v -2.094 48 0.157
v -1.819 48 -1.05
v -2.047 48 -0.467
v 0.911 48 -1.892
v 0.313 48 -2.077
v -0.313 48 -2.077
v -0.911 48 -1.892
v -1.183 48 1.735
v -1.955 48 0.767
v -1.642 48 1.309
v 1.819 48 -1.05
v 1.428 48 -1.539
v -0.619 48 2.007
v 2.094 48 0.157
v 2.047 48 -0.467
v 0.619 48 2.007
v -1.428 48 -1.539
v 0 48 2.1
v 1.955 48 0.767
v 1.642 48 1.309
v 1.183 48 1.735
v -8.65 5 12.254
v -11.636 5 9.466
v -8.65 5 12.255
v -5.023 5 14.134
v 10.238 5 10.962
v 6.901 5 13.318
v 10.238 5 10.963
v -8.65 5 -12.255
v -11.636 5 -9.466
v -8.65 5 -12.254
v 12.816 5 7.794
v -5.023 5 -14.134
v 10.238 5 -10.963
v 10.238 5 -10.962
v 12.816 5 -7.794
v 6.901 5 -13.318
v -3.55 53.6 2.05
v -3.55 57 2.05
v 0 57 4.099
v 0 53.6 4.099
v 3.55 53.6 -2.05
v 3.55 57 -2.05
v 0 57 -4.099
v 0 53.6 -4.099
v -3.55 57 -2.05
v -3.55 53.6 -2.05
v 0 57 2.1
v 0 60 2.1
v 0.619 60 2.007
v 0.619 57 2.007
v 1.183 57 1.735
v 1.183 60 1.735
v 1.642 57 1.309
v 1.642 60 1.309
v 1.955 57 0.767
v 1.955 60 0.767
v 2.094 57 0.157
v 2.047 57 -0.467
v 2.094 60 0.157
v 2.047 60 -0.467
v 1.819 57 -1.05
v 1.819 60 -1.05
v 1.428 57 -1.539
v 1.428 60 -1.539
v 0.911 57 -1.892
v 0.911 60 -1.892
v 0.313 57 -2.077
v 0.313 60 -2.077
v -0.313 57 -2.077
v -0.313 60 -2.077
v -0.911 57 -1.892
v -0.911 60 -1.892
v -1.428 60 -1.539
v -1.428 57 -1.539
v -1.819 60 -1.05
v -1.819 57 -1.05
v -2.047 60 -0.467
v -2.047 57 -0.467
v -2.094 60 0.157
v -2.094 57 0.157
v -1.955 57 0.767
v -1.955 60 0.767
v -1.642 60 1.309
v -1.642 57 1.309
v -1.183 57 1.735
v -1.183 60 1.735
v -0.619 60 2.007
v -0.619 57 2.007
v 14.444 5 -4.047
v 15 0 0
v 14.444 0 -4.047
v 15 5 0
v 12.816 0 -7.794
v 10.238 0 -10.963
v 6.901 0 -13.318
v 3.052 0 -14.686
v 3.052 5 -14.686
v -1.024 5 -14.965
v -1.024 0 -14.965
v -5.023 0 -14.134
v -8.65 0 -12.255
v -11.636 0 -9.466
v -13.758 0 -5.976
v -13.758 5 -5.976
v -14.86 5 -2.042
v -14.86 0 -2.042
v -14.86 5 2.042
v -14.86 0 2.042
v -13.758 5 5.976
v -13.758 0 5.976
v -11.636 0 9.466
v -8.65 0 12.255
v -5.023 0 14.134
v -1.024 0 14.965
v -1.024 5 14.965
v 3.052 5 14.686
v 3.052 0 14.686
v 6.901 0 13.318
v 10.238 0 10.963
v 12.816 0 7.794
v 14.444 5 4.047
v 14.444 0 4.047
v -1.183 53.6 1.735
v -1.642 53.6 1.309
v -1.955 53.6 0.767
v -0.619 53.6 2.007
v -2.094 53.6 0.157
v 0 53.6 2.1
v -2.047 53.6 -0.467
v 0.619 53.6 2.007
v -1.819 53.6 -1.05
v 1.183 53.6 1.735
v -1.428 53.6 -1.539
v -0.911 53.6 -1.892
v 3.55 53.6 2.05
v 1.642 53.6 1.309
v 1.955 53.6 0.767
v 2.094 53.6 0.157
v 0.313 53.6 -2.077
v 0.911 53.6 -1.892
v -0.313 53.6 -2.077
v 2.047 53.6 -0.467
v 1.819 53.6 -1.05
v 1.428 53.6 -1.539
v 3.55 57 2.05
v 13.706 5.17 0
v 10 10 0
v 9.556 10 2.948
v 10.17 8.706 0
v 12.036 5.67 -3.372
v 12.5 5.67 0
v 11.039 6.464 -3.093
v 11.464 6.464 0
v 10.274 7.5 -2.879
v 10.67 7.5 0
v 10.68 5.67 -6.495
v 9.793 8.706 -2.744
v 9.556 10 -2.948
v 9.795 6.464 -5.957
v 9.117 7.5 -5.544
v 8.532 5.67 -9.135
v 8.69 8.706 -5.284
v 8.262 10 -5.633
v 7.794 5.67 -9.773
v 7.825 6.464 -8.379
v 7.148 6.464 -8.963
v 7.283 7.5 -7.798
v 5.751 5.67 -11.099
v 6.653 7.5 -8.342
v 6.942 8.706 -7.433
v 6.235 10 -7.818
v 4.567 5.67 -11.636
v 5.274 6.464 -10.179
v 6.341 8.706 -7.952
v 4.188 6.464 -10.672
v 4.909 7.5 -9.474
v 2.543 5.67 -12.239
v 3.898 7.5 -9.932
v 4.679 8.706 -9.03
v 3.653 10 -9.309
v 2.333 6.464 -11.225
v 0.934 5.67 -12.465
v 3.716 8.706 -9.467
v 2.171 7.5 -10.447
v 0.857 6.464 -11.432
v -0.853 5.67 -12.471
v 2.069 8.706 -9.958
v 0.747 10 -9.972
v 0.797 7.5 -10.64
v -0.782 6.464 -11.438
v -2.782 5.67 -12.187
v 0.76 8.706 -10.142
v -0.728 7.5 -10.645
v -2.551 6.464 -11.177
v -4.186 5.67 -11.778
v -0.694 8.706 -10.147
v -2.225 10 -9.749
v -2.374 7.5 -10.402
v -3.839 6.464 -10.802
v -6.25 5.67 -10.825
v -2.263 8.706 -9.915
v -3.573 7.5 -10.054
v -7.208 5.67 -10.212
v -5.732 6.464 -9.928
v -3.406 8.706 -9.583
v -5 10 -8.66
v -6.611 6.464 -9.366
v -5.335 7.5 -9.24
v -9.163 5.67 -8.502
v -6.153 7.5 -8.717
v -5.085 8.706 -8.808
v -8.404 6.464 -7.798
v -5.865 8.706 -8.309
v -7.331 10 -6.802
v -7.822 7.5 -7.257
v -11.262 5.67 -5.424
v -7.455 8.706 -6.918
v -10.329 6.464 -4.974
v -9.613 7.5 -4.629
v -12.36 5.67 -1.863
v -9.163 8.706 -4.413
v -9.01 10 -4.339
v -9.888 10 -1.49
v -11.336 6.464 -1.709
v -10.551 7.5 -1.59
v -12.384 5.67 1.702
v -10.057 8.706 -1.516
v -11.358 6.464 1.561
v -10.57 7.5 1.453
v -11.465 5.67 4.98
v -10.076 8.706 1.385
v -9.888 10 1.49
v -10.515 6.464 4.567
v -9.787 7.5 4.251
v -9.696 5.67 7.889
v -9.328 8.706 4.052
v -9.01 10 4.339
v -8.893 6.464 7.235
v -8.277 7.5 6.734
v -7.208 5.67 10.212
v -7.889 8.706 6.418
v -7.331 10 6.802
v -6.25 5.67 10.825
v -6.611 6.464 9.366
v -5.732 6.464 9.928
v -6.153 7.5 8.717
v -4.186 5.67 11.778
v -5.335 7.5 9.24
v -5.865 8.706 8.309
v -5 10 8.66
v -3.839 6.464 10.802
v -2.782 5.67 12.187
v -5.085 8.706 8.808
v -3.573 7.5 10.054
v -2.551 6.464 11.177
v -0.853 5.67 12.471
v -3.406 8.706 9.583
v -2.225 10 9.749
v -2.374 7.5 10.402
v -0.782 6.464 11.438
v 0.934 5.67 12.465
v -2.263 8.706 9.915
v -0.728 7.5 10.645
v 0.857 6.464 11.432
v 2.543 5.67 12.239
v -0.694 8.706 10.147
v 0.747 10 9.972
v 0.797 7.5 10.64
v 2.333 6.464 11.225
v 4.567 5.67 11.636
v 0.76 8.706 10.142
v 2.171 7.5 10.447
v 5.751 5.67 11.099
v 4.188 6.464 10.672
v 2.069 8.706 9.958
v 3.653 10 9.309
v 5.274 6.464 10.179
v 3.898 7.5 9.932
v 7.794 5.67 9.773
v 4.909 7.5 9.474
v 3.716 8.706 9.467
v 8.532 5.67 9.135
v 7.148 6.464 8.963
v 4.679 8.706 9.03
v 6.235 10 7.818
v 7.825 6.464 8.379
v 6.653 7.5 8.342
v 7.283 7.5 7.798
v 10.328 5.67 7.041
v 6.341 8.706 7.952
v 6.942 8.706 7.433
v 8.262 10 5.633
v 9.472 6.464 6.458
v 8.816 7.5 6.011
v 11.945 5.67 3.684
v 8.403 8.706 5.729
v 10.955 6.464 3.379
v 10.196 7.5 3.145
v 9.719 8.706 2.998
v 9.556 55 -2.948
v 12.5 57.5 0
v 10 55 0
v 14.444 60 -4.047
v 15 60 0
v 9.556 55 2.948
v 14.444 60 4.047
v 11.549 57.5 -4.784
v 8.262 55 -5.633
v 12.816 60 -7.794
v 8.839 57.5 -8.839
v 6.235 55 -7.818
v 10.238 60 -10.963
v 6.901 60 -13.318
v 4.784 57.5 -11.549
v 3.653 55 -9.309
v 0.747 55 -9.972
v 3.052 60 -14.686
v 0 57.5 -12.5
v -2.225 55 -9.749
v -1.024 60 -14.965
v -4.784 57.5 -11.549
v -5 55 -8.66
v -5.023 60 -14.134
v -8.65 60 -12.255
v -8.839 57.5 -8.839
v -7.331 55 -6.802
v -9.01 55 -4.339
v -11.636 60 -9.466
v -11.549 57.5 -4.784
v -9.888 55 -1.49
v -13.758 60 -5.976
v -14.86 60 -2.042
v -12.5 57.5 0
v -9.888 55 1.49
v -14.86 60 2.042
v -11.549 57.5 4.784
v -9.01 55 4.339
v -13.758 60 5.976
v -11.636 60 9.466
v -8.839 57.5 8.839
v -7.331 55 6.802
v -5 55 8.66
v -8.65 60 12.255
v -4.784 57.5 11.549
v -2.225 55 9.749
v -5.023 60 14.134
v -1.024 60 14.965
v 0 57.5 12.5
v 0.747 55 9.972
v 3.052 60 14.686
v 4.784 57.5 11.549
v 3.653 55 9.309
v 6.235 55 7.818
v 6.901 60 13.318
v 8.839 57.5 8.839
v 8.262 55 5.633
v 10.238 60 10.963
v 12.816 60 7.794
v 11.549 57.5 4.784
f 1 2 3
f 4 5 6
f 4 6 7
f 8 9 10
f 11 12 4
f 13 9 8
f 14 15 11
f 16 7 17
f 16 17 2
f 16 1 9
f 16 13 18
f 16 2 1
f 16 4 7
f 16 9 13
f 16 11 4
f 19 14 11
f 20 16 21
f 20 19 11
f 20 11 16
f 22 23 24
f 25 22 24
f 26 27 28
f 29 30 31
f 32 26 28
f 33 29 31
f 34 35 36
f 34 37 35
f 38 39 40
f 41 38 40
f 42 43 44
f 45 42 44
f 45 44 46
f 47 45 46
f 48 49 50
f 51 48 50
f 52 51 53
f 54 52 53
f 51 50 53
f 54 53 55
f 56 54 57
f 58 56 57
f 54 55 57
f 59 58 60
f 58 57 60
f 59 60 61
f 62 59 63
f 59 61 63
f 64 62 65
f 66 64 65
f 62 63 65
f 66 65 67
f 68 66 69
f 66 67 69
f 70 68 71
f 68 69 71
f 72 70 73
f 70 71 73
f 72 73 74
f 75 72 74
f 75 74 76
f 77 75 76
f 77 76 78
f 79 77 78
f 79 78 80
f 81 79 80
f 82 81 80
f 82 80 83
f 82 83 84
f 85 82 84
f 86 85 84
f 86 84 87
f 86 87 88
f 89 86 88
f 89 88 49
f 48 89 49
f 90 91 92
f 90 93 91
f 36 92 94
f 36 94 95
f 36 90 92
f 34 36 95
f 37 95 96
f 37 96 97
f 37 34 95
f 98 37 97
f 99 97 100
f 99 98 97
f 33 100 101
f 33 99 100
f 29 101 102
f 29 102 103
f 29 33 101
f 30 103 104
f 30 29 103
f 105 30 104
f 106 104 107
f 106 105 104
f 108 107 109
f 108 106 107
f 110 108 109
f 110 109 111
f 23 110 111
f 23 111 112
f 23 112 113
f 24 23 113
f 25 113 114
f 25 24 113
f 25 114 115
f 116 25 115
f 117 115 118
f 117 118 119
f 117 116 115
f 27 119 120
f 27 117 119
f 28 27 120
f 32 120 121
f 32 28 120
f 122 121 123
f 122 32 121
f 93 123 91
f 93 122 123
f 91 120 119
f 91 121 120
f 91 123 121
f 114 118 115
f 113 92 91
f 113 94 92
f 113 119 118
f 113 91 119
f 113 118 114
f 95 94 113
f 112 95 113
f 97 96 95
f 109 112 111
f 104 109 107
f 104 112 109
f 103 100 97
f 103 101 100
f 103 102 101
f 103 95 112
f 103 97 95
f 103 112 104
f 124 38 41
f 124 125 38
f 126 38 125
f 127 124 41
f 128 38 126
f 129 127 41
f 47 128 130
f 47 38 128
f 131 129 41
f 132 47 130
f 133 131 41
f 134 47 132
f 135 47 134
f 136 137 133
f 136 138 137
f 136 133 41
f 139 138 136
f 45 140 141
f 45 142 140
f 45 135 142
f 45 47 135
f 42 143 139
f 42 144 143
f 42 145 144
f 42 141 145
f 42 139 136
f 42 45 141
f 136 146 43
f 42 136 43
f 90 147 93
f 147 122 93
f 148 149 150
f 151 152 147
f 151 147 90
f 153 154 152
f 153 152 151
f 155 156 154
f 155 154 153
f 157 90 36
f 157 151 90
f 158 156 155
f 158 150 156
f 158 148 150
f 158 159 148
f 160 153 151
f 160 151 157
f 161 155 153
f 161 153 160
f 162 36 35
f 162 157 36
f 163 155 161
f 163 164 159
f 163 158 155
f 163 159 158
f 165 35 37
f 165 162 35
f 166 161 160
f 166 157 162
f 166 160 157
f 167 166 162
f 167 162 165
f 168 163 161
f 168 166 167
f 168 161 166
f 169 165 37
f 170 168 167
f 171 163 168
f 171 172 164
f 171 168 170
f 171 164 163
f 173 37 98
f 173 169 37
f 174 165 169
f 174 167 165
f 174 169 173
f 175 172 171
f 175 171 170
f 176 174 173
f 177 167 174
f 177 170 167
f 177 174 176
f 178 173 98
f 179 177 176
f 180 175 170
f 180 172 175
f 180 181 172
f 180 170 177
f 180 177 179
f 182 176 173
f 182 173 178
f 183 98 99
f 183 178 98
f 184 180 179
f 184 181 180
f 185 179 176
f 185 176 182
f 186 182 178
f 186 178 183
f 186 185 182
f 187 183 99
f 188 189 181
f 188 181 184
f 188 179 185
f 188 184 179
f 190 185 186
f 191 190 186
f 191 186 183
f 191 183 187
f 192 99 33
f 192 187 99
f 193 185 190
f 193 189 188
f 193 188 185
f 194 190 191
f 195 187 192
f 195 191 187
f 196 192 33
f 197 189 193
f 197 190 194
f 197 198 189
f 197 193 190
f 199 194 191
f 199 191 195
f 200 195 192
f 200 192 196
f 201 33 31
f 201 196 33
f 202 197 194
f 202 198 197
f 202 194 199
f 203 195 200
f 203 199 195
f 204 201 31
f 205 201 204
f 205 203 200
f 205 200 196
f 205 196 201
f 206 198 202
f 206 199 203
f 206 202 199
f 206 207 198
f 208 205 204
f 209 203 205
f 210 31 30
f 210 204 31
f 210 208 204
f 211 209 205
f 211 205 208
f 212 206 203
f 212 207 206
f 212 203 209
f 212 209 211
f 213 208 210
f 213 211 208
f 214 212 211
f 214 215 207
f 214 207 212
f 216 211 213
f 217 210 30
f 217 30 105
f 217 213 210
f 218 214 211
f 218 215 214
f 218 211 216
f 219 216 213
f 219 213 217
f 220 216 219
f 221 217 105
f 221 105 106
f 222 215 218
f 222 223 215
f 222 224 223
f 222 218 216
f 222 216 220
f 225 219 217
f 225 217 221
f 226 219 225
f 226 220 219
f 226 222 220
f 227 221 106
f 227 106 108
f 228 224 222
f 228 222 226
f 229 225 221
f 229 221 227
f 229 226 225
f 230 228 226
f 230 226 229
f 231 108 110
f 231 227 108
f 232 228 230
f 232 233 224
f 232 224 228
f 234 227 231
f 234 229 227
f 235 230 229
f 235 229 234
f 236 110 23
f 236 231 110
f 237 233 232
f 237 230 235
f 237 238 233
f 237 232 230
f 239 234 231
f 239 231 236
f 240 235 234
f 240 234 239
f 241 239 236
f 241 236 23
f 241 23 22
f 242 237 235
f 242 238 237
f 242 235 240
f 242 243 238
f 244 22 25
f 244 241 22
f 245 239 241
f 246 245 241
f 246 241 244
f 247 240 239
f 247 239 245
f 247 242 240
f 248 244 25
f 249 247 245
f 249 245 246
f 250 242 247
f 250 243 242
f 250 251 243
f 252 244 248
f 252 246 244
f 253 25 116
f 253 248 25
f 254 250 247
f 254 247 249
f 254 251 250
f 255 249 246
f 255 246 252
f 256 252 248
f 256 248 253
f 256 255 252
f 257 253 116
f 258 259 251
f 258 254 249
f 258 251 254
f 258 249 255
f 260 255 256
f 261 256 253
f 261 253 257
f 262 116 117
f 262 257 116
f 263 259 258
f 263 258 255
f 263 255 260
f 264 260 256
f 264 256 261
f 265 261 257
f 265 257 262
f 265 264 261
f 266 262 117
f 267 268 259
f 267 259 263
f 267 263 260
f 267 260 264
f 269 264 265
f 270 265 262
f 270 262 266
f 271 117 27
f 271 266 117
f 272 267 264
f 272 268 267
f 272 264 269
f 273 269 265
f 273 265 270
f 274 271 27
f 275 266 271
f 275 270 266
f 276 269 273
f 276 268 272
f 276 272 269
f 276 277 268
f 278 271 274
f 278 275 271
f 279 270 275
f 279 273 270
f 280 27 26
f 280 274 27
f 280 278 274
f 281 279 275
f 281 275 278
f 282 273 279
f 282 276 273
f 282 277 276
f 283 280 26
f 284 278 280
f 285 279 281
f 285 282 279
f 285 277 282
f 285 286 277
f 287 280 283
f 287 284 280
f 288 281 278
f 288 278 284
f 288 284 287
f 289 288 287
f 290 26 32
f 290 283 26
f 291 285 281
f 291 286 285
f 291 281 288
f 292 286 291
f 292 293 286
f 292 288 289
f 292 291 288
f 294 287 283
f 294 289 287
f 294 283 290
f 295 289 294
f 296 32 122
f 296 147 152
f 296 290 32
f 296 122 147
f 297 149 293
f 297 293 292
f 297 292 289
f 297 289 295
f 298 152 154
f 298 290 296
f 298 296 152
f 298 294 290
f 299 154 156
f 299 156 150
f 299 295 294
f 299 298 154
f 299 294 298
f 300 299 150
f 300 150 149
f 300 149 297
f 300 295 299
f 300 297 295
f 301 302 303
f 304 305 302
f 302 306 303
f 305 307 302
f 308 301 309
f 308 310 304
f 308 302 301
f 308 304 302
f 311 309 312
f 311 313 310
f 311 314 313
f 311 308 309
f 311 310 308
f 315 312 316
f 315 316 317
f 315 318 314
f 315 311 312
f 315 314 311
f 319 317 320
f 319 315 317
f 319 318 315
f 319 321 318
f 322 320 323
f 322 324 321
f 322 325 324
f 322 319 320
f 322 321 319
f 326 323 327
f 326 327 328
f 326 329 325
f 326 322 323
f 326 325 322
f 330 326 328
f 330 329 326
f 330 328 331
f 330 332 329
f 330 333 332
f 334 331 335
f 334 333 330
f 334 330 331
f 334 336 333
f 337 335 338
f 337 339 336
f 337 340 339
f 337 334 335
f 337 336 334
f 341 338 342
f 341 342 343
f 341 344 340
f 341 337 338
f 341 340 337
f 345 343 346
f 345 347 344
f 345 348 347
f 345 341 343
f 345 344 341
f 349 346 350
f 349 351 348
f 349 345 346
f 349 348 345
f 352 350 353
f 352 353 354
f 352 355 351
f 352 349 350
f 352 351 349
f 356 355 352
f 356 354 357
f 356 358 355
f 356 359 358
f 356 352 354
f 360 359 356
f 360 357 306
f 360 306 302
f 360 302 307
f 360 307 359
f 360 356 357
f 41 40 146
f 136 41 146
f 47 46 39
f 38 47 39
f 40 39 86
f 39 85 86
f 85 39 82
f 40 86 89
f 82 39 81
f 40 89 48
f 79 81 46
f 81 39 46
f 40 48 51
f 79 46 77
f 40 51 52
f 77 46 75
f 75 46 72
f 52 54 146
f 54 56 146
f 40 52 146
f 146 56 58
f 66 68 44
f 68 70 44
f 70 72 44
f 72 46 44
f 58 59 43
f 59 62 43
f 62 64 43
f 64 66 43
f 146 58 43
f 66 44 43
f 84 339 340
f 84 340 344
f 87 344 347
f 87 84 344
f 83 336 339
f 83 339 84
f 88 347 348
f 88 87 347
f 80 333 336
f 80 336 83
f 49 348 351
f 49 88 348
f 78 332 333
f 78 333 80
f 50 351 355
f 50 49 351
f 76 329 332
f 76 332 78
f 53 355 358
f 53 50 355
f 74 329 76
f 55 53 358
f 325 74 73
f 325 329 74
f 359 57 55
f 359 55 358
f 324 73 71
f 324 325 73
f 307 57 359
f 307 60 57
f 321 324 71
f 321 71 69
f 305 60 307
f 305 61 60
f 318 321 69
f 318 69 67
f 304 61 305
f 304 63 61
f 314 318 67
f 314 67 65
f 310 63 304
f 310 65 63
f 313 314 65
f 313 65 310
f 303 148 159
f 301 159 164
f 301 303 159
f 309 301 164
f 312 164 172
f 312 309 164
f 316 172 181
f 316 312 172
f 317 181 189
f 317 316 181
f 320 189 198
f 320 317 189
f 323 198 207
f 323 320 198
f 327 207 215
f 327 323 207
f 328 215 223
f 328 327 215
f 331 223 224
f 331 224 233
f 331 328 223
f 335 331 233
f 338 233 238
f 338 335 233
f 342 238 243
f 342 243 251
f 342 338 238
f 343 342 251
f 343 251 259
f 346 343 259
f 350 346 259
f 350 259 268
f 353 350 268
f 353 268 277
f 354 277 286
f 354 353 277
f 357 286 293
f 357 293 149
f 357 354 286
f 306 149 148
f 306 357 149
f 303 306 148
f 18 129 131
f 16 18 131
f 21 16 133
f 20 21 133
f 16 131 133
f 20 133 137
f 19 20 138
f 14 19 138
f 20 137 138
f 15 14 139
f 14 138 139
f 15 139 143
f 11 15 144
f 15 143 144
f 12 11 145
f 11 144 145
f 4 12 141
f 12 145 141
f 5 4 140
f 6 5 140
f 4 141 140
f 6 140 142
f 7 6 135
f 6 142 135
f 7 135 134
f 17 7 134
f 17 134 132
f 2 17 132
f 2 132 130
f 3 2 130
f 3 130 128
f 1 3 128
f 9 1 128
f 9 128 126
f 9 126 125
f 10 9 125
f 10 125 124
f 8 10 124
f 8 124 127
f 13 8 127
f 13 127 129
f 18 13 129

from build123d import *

# Parameters (mm, degrees)
FILLET1_R          = 5
CUT_EXTRUDE1_START = -3
CUT_EXTRUDE1_DEPTH = 3.4
SKETCH3_R          = 2.1
CUT_EXTRUDE2_DEPTH = 12
CHAMFER1_SIZE      = 5


# Read off the part's stored shape, not the designer's step: Revolve-Thin2
with BuildPart() as part:
    # Revolve-Thin2 outline → Revolve-Thin2 (revolve)
    with BuildSketch(Plane.XY):
        Polygon((0, 60), (0, 0), (15, 0), (15, 5), (10, 5), (10, 55), (15, 55), (15, 60), align=None)
    revolve(axis=Axis((0, 0, 0), (0, 1, 0)))

    # Fillet1
    fillet1_edges = [part.edges().sort_by_distance(p)[0] for p in [
        (-10, 5, 0),
    ]]
    fillet(fillet1_edges, radius=FILLET1_R - 0.0001)  # a hair under: the kernel refuses the full size

    # Sketch2 → Cut-Extrude1 (cut)
    with BuildSketch(Plane(origin=(0, 60, 0), x_dir=(1, 0, 0), z_dir=(0, 1, 0)).offset(CUT_EXTRUDE1_START)):
        Polygon((0, 4.099186911), (-3.55, 2.049593456), (-3.55, -2.049593456), (0, -4.099186911), (3.55, -2.049593456), (3.55, 2.049593456), align=None)
    extrude(amount=-CUT_EXTRUDE1_DEPTH, mode=Mode.SUBTRACT)

    # Sketch3 → Cut-Extrude2 (cut)
    with BuildSketch(Plane(origin=(0, 60, 0), x_dir=(1, 0, 0), z_dir=(0, 1, 0))):
        with Locations(Location((0, 0, 0), (0, 0, 270))):
            Circle(SKETCH3_R)
    extrude(amount=-CUT_EXTRUDE2_DEPTH, mode=Mode.SUBTRACT)

    # Chamfer1
    chamfer1_edges = [part.edges().sort_by_distance(p)[0] for p in [
        (-15, 55, 0),
    ]]
    chamfer(chamfer1_edges, length=CHAMFER1_SIZE - 0.0001)  # a hair under: the kernel refuses the full size


solid = part.part
